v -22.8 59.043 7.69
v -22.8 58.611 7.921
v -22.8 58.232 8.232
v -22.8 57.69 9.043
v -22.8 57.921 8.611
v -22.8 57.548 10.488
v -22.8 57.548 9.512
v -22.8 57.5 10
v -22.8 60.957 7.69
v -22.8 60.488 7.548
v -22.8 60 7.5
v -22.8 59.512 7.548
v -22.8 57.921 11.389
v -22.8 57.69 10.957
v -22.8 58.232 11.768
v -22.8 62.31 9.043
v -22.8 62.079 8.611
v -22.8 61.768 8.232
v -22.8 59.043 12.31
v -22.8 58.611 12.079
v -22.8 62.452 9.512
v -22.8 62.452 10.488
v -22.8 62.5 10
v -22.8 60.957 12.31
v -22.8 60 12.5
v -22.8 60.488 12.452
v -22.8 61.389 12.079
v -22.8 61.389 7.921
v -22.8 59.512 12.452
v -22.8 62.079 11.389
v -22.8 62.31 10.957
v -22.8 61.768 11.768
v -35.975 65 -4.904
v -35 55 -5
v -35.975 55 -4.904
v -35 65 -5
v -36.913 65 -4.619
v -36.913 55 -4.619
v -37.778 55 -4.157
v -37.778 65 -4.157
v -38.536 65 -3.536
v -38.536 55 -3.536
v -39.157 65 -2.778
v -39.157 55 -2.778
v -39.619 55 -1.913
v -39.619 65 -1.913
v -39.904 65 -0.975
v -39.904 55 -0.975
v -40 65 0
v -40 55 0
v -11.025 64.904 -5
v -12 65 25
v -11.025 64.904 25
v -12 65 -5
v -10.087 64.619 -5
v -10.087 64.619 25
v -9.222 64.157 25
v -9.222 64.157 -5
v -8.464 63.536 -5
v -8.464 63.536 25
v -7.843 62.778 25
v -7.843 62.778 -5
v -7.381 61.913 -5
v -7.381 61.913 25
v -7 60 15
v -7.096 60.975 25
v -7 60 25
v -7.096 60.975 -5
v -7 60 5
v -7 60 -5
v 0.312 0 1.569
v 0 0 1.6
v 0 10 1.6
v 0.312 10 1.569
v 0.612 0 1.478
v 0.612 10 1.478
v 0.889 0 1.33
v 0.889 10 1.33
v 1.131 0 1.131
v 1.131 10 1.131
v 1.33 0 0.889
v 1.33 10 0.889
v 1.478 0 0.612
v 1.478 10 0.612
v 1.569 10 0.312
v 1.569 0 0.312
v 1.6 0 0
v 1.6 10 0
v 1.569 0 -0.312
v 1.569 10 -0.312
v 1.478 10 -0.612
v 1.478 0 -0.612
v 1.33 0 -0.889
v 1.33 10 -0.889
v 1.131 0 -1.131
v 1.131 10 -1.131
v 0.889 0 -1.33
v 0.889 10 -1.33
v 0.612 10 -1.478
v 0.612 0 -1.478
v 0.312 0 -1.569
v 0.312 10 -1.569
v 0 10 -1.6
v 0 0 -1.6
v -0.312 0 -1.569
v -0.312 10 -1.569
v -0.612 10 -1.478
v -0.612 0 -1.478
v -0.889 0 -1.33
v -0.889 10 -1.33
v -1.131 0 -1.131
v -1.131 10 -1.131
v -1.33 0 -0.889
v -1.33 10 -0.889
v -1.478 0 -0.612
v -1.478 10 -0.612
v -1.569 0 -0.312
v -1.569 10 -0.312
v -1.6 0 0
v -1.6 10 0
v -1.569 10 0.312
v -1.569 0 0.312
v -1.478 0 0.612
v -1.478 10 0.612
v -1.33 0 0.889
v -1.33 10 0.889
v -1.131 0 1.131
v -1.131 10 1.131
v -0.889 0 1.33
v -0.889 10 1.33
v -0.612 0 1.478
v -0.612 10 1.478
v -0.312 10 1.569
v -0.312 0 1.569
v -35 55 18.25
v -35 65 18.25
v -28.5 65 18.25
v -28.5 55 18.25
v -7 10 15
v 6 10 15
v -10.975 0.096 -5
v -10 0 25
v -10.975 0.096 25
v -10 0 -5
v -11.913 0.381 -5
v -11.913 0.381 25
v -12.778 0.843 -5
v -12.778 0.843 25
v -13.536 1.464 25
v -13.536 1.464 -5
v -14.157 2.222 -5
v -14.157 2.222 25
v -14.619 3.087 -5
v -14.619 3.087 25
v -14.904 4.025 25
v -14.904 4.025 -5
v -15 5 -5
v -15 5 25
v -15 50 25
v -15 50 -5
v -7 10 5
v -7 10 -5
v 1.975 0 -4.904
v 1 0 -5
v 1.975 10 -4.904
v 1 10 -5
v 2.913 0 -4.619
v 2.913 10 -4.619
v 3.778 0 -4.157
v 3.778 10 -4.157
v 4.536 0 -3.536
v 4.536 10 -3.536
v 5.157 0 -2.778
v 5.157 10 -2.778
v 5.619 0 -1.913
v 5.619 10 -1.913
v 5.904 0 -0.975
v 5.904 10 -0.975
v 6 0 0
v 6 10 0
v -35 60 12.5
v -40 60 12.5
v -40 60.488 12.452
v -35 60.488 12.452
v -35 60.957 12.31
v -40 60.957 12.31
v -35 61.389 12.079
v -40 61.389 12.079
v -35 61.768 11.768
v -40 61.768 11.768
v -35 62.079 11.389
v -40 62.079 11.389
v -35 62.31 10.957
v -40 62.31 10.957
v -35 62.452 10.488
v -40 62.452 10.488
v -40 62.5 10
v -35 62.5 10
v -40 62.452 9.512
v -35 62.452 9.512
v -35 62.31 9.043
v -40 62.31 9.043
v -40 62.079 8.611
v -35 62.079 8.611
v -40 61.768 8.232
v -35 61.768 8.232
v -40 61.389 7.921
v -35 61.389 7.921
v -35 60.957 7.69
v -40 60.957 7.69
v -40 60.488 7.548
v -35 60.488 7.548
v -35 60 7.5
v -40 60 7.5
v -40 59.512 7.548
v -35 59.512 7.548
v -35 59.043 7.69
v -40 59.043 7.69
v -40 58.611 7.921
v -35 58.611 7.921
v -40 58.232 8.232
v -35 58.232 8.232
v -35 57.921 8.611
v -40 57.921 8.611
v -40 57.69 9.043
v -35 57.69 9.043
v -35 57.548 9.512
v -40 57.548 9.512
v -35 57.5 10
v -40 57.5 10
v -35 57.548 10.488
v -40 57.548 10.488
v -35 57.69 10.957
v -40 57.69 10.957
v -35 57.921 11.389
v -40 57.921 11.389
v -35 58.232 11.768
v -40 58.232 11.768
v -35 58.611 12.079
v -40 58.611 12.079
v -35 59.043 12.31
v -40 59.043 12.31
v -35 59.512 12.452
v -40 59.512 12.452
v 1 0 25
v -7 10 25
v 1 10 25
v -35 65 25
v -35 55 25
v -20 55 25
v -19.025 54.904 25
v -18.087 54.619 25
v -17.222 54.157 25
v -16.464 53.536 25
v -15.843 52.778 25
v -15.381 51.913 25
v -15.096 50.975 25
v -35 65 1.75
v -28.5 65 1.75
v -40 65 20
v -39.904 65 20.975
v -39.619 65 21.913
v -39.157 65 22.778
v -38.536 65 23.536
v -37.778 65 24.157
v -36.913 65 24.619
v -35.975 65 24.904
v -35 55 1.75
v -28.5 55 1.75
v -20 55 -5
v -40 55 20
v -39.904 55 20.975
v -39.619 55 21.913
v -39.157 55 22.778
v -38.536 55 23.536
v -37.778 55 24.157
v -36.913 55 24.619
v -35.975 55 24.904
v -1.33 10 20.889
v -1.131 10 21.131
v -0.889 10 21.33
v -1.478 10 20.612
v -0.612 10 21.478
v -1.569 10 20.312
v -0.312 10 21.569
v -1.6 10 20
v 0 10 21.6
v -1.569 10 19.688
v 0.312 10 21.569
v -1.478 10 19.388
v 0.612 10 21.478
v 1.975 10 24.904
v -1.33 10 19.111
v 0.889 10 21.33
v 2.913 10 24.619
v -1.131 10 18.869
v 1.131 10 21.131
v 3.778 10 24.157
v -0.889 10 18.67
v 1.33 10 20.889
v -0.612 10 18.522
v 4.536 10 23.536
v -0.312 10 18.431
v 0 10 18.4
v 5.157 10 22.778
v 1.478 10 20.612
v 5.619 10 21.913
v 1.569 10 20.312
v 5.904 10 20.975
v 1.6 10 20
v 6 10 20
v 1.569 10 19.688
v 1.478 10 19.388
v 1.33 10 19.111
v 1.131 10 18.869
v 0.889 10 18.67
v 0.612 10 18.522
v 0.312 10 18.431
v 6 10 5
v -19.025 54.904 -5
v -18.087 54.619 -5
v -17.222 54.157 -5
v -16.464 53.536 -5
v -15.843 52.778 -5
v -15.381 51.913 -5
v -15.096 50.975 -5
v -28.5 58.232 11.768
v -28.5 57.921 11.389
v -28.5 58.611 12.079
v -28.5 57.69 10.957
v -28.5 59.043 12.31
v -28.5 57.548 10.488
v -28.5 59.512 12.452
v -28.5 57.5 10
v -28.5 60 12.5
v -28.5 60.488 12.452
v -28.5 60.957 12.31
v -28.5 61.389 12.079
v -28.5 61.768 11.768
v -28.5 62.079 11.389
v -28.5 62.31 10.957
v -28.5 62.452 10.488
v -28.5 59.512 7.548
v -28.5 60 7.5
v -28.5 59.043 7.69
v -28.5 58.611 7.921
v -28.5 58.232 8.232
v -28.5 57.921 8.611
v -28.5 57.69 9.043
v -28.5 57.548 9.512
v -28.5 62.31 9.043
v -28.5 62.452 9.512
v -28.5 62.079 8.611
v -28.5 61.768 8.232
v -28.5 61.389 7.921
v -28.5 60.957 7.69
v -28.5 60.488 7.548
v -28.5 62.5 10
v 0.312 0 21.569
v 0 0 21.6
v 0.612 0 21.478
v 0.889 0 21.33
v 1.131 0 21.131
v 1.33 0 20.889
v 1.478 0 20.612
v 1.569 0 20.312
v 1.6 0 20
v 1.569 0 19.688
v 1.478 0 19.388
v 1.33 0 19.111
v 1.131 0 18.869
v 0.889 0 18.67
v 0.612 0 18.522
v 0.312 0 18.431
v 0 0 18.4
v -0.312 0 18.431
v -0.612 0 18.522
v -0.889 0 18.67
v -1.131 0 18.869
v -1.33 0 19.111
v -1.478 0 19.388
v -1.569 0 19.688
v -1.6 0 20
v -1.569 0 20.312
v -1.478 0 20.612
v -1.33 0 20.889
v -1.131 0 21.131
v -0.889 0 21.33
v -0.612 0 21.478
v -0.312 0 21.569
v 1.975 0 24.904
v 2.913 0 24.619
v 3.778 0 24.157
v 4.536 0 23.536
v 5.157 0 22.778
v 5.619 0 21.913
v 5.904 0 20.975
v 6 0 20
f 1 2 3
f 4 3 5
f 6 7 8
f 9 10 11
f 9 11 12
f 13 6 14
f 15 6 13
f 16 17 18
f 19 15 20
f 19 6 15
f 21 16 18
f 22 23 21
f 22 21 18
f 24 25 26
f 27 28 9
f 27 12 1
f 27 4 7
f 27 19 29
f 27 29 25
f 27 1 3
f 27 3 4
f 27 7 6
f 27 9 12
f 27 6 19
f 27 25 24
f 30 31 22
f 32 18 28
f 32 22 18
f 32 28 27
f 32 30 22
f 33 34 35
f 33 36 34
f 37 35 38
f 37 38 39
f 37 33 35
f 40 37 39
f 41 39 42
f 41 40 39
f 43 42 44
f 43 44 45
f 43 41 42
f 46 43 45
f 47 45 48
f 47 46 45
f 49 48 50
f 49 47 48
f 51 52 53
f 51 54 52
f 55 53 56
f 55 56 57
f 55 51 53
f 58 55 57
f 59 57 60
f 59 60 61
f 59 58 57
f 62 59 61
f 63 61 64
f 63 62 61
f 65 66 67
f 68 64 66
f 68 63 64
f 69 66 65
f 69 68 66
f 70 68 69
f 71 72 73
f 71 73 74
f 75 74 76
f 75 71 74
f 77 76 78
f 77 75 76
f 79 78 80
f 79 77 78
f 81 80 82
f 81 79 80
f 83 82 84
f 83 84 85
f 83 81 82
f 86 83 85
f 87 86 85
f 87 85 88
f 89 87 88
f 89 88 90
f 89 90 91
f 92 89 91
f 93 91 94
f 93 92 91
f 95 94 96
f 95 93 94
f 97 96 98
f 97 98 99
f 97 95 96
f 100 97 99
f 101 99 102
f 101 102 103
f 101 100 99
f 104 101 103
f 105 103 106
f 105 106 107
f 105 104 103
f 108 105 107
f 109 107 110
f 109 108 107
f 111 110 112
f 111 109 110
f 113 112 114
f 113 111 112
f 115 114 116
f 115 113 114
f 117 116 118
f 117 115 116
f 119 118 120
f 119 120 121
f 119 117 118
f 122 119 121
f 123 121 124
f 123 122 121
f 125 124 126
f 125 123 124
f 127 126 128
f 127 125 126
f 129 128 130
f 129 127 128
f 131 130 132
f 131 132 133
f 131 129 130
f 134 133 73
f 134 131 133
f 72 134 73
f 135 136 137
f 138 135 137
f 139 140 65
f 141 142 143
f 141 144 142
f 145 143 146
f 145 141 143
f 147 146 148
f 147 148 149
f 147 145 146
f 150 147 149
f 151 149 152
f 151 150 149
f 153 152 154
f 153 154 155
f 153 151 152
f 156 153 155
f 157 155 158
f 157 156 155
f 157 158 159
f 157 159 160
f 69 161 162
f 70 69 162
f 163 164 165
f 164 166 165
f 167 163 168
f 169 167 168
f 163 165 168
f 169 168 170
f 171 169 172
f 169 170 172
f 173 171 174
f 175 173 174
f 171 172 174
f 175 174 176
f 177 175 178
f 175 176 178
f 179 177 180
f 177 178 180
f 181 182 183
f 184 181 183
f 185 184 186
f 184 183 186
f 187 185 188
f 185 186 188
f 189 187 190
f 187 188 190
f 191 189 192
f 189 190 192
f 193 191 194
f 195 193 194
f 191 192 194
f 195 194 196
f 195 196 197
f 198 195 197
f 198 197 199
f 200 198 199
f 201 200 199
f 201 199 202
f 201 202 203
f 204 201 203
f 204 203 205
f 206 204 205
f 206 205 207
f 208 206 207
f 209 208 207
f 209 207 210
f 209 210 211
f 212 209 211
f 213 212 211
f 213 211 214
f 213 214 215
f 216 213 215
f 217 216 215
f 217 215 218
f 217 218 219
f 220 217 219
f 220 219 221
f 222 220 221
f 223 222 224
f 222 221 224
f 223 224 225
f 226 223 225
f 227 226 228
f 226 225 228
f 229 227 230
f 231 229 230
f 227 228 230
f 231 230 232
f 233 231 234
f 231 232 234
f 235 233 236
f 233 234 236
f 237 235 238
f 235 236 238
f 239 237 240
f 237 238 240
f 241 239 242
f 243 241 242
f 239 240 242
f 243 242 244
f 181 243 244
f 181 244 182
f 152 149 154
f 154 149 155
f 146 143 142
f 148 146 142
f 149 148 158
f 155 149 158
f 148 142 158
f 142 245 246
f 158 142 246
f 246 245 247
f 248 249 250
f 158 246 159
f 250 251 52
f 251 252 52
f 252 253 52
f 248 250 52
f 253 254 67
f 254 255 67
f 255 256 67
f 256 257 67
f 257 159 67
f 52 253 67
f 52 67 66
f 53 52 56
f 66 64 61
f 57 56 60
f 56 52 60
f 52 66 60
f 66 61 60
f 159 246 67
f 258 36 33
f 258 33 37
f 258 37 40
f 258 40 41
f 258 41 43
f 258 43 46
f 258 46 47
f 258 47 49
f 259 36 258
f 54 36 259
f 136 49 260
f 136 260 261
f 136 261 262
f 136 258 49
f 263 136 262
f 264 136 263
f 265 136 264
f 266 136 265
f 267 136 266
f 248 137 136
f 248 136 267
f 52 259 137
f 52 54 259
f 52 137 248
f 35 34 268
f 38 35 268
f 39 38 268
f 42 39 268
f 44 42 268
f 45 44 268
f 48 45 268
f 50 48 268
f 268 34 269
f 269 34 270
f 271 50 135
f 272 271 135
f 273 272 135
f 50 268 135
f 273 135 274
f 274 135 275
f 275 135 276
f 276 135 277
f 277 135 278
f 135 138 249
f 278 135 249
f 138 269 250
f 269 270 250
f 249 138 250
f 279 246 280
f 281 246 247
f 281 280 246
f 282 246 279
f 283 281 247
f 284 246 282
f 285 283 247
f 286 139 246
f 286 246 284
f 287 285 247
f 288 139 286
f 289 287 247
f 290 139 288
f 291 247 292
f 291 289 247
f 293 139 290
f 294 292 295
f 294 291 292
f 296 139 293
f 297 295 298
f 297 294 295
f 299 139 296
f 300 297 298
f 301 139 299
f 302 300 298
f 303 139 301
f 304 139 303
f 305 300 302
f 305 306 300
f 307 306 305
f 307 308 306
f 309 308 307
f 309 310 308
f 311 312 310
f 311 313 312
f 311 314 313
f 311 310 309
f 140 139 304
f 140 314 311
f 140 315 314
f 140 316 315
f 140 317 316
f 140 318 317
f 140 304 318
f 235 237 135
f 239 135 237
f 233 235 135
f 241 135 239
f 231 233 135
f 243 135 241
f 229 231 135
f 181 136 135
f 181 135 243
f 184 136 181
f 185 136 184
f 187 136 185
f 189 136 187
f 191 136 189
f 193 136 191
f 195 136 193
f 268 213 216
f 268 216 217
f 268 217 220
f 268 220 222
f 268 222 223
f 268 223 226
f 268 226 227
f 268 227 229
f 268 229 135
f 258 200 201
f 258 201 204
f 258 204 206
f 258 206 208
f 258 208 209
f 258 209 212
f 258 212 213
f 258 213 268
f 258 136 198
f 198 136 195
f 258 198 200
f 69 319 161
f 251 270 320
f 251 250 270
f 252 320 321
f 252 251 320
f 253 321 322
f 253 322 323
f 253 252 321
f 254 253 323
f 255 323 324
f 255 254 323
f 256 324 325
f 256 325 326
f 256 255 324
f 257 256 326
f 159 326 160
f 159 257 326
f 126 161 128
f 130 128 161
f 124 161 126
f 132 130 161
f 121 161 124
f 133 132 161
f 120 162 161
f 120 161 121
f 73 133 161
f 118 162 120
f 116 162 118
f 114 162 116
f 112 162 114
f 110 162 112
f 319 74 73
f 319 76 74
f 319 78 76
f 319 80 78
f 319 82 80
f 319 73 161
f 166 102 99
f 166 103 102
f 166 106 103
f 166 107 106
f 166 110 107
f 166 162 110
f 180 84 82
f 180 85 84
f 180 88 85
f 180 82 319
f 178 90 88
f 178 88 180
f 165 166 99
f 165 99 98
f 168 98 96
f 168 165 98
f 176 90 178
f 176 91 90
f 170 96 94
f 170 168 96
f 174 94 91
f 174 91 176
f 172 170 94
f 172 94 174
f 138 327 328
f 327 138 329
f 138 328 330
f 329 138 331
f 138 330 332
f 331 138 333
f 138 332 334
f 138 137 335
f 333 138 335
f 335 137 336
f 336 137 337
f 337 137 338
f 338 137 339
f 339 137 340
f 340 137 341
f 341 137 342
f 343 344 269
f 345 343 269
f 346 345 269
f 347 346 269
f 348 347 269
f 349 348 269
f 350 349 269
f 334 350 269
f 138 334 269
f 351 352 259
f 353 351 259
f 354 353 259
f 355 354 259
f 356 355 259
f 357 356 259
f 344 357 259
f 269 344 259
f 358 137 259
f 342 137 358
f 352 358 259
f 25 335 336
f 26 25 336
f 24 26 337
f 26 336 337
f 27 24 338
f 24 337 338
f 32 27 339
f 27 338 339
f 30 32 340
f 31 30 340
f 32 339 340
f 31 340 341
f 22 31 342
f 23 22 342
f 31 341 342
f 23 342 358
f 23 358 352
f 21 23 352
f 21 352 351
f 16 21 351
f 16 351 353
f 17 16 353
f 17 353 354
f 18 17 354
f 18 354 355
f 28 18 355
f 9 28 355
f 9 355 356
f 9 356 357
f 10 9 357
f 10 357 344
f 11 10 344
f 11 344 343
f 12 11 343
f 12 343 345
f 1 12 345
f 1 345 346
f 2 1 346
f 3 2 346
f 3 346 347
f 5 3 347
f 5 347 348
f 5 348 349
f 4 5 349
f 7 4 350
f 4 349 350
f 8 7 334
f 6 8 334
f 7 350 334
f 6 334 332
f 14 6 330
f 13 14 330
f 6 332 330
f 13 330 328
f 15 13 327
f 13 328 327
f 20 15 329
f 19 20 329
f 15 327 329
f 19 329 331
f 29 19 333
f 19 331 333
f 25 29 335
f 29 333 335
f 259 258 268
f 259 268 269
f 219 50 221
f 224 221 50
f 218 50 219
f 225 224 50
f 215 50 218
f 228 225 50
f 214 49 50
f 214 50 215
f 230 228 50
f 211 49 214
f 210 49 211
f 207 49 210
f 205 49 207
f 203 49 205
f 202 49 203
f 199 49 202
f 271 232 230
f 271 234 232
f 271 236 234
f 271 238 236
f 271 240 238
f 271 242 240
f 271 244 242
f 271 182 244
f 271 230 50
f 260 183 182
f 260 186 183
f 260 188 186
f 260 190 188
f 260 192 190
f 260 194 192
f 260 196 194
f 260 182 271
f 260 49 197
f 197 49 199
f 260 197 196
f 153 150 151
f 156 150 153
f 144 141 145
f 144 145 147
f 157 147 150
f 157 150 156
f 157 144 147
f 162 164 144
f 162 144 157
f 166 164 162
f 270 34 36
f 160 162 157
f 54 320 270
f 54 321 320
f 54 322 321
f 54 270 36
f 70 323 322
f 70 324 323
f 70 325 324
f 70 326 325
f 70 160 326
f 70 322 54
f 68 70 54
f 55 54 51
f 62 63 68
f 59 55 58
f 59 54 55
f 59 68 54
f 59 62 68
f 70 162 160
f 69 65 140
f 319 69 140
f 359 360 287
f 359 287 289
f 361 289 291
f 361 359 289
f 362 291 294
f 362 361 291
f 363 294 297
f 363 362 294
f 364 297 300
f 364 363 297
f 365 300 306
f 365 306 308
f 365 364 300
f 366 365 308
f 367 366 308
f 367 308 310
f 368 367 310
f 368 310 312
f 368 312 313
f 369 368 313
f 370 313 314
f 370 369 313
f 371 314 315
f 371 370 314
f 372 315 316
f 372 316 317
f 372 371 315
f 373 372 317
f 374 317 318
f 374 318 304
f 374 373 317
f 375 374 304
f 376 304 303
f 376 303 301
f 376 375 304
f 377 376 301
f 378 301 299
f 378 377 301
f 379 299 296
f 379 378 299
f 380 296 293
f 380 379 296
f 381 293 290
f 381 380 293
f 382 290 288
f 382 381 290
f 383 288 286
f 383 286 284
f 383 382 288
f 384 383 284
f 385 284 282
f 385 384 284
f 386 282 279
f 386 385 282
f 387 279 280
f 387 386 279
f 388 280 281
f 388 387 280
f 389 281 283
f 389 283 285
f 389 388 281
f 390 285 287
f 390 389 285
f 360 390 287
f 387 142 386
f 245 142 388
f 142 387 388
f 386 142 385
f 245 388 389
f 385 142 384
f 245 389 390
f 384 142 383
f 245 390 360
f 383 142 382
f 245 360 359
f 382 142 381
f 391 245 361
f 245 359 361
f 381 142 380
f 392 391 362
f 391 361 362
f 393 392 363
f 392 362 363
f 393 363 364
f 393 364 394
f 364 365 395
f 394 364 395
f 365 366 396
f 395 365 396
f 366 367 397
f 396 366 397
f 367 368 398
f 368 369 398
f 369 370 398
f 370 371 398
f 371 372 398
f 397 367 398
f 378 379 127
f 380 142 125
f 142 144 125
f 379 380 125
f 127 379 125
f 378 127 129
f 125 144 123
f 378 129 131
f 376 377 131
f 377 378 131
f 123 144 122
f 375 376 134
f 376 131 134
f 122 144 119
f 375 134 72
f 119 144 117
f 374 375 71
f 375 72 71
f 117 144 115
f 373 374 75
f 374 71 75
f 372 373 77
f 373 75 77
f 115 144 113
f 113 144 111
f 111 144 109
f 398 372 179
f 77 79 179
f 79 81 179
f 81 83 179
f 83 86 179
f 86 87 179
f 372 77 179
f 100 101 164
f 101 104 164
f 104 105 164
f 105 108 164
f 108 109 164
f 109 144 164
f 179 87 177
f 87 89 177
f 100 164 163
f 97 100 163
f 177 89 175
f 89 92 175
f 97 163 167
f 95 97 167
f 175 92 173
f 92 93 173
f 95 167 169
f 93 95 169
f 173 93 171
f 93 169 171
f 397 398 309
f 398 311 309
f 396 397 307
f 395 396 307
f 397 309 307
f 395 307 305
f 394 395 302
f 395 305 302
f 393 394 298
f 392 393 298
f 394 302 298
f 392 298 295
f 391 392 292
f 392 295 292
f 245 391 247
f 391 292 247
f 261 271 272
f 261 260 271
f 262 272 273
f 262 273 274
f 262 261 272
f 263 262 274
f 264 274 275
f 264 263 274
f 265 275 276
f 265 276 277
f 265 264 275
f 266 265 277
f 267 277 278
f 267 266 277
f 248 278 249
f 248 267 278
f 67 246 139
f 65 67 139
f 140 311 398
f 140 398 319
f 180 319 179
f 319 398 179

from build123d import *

# Parameters (mm, degrees)
SKETCH1_W           = 21
SKETCH1_H           = 30
SKETCH1_R           = 1.6
BOSS_EXTRUDE3_DEPTH = 10
SKETCH3_W           = 8
SKETCH3_H           = 30
BOSS_EXTRUDE4_DEPTH = 55
SKETCH4_W           = 30
SKETCH4_H           = 10
BOSS_EXTRUDE5_DEPTH = 25
CUT_EXTRUDE1_REACH  = 82.312
SKETCH5_W           = 6.5
SKETCH5_H           = 16.5
SKETCH7_R           = 2.5
CUT_EXTRUDE2_DEPTH  = 17.2
FILLET2_R           = 5
BOSS_EXTRUDE7_START = -10
BOSS_EXTRUDE7_DEPTH = 10


with BuildPart() as part:
    # Sketch1 → Boss-Extrude3 (new body)
    with BuildSketch(Plane(origin=(0, 0, 0), x_dir=(1, 0, 0), z_dir=(0, 1, 0))):
        with Locations((-4.5, -10)):
            Rectangle(SKETCH1_W, SKETCH1_H)
        with Locations(Location((0, 0, 0), (0, 0, 270))):
            Circle(SKETCH1_R, mode=Mode.SUBTRACT)
        with Locations(Location((0, -20, 0), (0, 0, 270))):
            Circle(SKETCH1_R, mode=Mode.SUBTRACT)
    extrude(amount=BOSS_EXTRUDE3_DEPTH)

    # Sketch3 → Boss-Extrude4 (add)
    with BuildSketch(Plane(origin=(0, 10, 0), x_dir=(1, 0, 0), z_dir=(0, 1, 0))):
        with Locations((-11, -10)):
            Rectangle(SKETCH3_W, SKETCH3_H)
    extrude(amount=BOSS_EXTRUDE4_DEPTH)

    # Sketch4 → Boss-Extrude5 (add)
    with BuildSketch(Plane.ZY.offset(15)):
        with Locations((10, 60)):
            Rectangle(SKETCH4_W, SKETCH4_H)
    extrude(amount=BOSS_EXTRUDE5_DEPTH)

    # Sketch5 → Cut-Extrude1 (cut, up to next)
    with BuildSketch(Plane(origin=(0, 65, 0), x_dir=(1, 0, 0), z_dir=(0, 1, 0)), mode=Mode.PRIVATE) as cut_extrude1_sk1:
        with Locations((-31.75, -10)):
            Rectangle(SKETCH5_W, SKETCH5_H)
    cut_extrude1_tool1 = extrude(cut_extrude1_sk1.sketch, amount=-CUT_EXTRUDE1_REACH, mode=Mode.PRIVATE) & part.part
    add(cut_extrude1_tool1.solids().sort_by_distance((-31.75, 65, 10))[0], mode=Mode.SUBTRACT)

    # Sketch7 → Cut-Extrude2 (cut)
    with BuildSketch(Plane.ZY.offset(40)):
        with Locations((10, 60)):
            Circle(SKETCH7_R)
    extrude(amount=-CUT_EXTRUDE2_DEPTH, mode=Mode.SUBTRACT)

    # Fillet2
    fillet2_edges = [part.edges().sort_by_distance(p)[0] for p in [
        (-7, 65, 10),
        (-15, 55, 10),
        (-40, 60, -5),
        (-40, 60, 25),
        (-15, 0, 10),
        (6, 5, -5),
        (6, 5, 25),
    ]]
    fillet(fillet2_edges, radius=FILLET2_R)

    # Sketch8 → Boss-Extrude7 (add)
    with BuildSketch(Plane.XY.offset(25).offset(BOSS_EXTRUDE7_START)):
        Polygon((-7, 10), (-7, 60), (6, 10), align=None)
    extrude(amount=-BOSS_EXTRUDE7_DEPTH)


solid = part.part
